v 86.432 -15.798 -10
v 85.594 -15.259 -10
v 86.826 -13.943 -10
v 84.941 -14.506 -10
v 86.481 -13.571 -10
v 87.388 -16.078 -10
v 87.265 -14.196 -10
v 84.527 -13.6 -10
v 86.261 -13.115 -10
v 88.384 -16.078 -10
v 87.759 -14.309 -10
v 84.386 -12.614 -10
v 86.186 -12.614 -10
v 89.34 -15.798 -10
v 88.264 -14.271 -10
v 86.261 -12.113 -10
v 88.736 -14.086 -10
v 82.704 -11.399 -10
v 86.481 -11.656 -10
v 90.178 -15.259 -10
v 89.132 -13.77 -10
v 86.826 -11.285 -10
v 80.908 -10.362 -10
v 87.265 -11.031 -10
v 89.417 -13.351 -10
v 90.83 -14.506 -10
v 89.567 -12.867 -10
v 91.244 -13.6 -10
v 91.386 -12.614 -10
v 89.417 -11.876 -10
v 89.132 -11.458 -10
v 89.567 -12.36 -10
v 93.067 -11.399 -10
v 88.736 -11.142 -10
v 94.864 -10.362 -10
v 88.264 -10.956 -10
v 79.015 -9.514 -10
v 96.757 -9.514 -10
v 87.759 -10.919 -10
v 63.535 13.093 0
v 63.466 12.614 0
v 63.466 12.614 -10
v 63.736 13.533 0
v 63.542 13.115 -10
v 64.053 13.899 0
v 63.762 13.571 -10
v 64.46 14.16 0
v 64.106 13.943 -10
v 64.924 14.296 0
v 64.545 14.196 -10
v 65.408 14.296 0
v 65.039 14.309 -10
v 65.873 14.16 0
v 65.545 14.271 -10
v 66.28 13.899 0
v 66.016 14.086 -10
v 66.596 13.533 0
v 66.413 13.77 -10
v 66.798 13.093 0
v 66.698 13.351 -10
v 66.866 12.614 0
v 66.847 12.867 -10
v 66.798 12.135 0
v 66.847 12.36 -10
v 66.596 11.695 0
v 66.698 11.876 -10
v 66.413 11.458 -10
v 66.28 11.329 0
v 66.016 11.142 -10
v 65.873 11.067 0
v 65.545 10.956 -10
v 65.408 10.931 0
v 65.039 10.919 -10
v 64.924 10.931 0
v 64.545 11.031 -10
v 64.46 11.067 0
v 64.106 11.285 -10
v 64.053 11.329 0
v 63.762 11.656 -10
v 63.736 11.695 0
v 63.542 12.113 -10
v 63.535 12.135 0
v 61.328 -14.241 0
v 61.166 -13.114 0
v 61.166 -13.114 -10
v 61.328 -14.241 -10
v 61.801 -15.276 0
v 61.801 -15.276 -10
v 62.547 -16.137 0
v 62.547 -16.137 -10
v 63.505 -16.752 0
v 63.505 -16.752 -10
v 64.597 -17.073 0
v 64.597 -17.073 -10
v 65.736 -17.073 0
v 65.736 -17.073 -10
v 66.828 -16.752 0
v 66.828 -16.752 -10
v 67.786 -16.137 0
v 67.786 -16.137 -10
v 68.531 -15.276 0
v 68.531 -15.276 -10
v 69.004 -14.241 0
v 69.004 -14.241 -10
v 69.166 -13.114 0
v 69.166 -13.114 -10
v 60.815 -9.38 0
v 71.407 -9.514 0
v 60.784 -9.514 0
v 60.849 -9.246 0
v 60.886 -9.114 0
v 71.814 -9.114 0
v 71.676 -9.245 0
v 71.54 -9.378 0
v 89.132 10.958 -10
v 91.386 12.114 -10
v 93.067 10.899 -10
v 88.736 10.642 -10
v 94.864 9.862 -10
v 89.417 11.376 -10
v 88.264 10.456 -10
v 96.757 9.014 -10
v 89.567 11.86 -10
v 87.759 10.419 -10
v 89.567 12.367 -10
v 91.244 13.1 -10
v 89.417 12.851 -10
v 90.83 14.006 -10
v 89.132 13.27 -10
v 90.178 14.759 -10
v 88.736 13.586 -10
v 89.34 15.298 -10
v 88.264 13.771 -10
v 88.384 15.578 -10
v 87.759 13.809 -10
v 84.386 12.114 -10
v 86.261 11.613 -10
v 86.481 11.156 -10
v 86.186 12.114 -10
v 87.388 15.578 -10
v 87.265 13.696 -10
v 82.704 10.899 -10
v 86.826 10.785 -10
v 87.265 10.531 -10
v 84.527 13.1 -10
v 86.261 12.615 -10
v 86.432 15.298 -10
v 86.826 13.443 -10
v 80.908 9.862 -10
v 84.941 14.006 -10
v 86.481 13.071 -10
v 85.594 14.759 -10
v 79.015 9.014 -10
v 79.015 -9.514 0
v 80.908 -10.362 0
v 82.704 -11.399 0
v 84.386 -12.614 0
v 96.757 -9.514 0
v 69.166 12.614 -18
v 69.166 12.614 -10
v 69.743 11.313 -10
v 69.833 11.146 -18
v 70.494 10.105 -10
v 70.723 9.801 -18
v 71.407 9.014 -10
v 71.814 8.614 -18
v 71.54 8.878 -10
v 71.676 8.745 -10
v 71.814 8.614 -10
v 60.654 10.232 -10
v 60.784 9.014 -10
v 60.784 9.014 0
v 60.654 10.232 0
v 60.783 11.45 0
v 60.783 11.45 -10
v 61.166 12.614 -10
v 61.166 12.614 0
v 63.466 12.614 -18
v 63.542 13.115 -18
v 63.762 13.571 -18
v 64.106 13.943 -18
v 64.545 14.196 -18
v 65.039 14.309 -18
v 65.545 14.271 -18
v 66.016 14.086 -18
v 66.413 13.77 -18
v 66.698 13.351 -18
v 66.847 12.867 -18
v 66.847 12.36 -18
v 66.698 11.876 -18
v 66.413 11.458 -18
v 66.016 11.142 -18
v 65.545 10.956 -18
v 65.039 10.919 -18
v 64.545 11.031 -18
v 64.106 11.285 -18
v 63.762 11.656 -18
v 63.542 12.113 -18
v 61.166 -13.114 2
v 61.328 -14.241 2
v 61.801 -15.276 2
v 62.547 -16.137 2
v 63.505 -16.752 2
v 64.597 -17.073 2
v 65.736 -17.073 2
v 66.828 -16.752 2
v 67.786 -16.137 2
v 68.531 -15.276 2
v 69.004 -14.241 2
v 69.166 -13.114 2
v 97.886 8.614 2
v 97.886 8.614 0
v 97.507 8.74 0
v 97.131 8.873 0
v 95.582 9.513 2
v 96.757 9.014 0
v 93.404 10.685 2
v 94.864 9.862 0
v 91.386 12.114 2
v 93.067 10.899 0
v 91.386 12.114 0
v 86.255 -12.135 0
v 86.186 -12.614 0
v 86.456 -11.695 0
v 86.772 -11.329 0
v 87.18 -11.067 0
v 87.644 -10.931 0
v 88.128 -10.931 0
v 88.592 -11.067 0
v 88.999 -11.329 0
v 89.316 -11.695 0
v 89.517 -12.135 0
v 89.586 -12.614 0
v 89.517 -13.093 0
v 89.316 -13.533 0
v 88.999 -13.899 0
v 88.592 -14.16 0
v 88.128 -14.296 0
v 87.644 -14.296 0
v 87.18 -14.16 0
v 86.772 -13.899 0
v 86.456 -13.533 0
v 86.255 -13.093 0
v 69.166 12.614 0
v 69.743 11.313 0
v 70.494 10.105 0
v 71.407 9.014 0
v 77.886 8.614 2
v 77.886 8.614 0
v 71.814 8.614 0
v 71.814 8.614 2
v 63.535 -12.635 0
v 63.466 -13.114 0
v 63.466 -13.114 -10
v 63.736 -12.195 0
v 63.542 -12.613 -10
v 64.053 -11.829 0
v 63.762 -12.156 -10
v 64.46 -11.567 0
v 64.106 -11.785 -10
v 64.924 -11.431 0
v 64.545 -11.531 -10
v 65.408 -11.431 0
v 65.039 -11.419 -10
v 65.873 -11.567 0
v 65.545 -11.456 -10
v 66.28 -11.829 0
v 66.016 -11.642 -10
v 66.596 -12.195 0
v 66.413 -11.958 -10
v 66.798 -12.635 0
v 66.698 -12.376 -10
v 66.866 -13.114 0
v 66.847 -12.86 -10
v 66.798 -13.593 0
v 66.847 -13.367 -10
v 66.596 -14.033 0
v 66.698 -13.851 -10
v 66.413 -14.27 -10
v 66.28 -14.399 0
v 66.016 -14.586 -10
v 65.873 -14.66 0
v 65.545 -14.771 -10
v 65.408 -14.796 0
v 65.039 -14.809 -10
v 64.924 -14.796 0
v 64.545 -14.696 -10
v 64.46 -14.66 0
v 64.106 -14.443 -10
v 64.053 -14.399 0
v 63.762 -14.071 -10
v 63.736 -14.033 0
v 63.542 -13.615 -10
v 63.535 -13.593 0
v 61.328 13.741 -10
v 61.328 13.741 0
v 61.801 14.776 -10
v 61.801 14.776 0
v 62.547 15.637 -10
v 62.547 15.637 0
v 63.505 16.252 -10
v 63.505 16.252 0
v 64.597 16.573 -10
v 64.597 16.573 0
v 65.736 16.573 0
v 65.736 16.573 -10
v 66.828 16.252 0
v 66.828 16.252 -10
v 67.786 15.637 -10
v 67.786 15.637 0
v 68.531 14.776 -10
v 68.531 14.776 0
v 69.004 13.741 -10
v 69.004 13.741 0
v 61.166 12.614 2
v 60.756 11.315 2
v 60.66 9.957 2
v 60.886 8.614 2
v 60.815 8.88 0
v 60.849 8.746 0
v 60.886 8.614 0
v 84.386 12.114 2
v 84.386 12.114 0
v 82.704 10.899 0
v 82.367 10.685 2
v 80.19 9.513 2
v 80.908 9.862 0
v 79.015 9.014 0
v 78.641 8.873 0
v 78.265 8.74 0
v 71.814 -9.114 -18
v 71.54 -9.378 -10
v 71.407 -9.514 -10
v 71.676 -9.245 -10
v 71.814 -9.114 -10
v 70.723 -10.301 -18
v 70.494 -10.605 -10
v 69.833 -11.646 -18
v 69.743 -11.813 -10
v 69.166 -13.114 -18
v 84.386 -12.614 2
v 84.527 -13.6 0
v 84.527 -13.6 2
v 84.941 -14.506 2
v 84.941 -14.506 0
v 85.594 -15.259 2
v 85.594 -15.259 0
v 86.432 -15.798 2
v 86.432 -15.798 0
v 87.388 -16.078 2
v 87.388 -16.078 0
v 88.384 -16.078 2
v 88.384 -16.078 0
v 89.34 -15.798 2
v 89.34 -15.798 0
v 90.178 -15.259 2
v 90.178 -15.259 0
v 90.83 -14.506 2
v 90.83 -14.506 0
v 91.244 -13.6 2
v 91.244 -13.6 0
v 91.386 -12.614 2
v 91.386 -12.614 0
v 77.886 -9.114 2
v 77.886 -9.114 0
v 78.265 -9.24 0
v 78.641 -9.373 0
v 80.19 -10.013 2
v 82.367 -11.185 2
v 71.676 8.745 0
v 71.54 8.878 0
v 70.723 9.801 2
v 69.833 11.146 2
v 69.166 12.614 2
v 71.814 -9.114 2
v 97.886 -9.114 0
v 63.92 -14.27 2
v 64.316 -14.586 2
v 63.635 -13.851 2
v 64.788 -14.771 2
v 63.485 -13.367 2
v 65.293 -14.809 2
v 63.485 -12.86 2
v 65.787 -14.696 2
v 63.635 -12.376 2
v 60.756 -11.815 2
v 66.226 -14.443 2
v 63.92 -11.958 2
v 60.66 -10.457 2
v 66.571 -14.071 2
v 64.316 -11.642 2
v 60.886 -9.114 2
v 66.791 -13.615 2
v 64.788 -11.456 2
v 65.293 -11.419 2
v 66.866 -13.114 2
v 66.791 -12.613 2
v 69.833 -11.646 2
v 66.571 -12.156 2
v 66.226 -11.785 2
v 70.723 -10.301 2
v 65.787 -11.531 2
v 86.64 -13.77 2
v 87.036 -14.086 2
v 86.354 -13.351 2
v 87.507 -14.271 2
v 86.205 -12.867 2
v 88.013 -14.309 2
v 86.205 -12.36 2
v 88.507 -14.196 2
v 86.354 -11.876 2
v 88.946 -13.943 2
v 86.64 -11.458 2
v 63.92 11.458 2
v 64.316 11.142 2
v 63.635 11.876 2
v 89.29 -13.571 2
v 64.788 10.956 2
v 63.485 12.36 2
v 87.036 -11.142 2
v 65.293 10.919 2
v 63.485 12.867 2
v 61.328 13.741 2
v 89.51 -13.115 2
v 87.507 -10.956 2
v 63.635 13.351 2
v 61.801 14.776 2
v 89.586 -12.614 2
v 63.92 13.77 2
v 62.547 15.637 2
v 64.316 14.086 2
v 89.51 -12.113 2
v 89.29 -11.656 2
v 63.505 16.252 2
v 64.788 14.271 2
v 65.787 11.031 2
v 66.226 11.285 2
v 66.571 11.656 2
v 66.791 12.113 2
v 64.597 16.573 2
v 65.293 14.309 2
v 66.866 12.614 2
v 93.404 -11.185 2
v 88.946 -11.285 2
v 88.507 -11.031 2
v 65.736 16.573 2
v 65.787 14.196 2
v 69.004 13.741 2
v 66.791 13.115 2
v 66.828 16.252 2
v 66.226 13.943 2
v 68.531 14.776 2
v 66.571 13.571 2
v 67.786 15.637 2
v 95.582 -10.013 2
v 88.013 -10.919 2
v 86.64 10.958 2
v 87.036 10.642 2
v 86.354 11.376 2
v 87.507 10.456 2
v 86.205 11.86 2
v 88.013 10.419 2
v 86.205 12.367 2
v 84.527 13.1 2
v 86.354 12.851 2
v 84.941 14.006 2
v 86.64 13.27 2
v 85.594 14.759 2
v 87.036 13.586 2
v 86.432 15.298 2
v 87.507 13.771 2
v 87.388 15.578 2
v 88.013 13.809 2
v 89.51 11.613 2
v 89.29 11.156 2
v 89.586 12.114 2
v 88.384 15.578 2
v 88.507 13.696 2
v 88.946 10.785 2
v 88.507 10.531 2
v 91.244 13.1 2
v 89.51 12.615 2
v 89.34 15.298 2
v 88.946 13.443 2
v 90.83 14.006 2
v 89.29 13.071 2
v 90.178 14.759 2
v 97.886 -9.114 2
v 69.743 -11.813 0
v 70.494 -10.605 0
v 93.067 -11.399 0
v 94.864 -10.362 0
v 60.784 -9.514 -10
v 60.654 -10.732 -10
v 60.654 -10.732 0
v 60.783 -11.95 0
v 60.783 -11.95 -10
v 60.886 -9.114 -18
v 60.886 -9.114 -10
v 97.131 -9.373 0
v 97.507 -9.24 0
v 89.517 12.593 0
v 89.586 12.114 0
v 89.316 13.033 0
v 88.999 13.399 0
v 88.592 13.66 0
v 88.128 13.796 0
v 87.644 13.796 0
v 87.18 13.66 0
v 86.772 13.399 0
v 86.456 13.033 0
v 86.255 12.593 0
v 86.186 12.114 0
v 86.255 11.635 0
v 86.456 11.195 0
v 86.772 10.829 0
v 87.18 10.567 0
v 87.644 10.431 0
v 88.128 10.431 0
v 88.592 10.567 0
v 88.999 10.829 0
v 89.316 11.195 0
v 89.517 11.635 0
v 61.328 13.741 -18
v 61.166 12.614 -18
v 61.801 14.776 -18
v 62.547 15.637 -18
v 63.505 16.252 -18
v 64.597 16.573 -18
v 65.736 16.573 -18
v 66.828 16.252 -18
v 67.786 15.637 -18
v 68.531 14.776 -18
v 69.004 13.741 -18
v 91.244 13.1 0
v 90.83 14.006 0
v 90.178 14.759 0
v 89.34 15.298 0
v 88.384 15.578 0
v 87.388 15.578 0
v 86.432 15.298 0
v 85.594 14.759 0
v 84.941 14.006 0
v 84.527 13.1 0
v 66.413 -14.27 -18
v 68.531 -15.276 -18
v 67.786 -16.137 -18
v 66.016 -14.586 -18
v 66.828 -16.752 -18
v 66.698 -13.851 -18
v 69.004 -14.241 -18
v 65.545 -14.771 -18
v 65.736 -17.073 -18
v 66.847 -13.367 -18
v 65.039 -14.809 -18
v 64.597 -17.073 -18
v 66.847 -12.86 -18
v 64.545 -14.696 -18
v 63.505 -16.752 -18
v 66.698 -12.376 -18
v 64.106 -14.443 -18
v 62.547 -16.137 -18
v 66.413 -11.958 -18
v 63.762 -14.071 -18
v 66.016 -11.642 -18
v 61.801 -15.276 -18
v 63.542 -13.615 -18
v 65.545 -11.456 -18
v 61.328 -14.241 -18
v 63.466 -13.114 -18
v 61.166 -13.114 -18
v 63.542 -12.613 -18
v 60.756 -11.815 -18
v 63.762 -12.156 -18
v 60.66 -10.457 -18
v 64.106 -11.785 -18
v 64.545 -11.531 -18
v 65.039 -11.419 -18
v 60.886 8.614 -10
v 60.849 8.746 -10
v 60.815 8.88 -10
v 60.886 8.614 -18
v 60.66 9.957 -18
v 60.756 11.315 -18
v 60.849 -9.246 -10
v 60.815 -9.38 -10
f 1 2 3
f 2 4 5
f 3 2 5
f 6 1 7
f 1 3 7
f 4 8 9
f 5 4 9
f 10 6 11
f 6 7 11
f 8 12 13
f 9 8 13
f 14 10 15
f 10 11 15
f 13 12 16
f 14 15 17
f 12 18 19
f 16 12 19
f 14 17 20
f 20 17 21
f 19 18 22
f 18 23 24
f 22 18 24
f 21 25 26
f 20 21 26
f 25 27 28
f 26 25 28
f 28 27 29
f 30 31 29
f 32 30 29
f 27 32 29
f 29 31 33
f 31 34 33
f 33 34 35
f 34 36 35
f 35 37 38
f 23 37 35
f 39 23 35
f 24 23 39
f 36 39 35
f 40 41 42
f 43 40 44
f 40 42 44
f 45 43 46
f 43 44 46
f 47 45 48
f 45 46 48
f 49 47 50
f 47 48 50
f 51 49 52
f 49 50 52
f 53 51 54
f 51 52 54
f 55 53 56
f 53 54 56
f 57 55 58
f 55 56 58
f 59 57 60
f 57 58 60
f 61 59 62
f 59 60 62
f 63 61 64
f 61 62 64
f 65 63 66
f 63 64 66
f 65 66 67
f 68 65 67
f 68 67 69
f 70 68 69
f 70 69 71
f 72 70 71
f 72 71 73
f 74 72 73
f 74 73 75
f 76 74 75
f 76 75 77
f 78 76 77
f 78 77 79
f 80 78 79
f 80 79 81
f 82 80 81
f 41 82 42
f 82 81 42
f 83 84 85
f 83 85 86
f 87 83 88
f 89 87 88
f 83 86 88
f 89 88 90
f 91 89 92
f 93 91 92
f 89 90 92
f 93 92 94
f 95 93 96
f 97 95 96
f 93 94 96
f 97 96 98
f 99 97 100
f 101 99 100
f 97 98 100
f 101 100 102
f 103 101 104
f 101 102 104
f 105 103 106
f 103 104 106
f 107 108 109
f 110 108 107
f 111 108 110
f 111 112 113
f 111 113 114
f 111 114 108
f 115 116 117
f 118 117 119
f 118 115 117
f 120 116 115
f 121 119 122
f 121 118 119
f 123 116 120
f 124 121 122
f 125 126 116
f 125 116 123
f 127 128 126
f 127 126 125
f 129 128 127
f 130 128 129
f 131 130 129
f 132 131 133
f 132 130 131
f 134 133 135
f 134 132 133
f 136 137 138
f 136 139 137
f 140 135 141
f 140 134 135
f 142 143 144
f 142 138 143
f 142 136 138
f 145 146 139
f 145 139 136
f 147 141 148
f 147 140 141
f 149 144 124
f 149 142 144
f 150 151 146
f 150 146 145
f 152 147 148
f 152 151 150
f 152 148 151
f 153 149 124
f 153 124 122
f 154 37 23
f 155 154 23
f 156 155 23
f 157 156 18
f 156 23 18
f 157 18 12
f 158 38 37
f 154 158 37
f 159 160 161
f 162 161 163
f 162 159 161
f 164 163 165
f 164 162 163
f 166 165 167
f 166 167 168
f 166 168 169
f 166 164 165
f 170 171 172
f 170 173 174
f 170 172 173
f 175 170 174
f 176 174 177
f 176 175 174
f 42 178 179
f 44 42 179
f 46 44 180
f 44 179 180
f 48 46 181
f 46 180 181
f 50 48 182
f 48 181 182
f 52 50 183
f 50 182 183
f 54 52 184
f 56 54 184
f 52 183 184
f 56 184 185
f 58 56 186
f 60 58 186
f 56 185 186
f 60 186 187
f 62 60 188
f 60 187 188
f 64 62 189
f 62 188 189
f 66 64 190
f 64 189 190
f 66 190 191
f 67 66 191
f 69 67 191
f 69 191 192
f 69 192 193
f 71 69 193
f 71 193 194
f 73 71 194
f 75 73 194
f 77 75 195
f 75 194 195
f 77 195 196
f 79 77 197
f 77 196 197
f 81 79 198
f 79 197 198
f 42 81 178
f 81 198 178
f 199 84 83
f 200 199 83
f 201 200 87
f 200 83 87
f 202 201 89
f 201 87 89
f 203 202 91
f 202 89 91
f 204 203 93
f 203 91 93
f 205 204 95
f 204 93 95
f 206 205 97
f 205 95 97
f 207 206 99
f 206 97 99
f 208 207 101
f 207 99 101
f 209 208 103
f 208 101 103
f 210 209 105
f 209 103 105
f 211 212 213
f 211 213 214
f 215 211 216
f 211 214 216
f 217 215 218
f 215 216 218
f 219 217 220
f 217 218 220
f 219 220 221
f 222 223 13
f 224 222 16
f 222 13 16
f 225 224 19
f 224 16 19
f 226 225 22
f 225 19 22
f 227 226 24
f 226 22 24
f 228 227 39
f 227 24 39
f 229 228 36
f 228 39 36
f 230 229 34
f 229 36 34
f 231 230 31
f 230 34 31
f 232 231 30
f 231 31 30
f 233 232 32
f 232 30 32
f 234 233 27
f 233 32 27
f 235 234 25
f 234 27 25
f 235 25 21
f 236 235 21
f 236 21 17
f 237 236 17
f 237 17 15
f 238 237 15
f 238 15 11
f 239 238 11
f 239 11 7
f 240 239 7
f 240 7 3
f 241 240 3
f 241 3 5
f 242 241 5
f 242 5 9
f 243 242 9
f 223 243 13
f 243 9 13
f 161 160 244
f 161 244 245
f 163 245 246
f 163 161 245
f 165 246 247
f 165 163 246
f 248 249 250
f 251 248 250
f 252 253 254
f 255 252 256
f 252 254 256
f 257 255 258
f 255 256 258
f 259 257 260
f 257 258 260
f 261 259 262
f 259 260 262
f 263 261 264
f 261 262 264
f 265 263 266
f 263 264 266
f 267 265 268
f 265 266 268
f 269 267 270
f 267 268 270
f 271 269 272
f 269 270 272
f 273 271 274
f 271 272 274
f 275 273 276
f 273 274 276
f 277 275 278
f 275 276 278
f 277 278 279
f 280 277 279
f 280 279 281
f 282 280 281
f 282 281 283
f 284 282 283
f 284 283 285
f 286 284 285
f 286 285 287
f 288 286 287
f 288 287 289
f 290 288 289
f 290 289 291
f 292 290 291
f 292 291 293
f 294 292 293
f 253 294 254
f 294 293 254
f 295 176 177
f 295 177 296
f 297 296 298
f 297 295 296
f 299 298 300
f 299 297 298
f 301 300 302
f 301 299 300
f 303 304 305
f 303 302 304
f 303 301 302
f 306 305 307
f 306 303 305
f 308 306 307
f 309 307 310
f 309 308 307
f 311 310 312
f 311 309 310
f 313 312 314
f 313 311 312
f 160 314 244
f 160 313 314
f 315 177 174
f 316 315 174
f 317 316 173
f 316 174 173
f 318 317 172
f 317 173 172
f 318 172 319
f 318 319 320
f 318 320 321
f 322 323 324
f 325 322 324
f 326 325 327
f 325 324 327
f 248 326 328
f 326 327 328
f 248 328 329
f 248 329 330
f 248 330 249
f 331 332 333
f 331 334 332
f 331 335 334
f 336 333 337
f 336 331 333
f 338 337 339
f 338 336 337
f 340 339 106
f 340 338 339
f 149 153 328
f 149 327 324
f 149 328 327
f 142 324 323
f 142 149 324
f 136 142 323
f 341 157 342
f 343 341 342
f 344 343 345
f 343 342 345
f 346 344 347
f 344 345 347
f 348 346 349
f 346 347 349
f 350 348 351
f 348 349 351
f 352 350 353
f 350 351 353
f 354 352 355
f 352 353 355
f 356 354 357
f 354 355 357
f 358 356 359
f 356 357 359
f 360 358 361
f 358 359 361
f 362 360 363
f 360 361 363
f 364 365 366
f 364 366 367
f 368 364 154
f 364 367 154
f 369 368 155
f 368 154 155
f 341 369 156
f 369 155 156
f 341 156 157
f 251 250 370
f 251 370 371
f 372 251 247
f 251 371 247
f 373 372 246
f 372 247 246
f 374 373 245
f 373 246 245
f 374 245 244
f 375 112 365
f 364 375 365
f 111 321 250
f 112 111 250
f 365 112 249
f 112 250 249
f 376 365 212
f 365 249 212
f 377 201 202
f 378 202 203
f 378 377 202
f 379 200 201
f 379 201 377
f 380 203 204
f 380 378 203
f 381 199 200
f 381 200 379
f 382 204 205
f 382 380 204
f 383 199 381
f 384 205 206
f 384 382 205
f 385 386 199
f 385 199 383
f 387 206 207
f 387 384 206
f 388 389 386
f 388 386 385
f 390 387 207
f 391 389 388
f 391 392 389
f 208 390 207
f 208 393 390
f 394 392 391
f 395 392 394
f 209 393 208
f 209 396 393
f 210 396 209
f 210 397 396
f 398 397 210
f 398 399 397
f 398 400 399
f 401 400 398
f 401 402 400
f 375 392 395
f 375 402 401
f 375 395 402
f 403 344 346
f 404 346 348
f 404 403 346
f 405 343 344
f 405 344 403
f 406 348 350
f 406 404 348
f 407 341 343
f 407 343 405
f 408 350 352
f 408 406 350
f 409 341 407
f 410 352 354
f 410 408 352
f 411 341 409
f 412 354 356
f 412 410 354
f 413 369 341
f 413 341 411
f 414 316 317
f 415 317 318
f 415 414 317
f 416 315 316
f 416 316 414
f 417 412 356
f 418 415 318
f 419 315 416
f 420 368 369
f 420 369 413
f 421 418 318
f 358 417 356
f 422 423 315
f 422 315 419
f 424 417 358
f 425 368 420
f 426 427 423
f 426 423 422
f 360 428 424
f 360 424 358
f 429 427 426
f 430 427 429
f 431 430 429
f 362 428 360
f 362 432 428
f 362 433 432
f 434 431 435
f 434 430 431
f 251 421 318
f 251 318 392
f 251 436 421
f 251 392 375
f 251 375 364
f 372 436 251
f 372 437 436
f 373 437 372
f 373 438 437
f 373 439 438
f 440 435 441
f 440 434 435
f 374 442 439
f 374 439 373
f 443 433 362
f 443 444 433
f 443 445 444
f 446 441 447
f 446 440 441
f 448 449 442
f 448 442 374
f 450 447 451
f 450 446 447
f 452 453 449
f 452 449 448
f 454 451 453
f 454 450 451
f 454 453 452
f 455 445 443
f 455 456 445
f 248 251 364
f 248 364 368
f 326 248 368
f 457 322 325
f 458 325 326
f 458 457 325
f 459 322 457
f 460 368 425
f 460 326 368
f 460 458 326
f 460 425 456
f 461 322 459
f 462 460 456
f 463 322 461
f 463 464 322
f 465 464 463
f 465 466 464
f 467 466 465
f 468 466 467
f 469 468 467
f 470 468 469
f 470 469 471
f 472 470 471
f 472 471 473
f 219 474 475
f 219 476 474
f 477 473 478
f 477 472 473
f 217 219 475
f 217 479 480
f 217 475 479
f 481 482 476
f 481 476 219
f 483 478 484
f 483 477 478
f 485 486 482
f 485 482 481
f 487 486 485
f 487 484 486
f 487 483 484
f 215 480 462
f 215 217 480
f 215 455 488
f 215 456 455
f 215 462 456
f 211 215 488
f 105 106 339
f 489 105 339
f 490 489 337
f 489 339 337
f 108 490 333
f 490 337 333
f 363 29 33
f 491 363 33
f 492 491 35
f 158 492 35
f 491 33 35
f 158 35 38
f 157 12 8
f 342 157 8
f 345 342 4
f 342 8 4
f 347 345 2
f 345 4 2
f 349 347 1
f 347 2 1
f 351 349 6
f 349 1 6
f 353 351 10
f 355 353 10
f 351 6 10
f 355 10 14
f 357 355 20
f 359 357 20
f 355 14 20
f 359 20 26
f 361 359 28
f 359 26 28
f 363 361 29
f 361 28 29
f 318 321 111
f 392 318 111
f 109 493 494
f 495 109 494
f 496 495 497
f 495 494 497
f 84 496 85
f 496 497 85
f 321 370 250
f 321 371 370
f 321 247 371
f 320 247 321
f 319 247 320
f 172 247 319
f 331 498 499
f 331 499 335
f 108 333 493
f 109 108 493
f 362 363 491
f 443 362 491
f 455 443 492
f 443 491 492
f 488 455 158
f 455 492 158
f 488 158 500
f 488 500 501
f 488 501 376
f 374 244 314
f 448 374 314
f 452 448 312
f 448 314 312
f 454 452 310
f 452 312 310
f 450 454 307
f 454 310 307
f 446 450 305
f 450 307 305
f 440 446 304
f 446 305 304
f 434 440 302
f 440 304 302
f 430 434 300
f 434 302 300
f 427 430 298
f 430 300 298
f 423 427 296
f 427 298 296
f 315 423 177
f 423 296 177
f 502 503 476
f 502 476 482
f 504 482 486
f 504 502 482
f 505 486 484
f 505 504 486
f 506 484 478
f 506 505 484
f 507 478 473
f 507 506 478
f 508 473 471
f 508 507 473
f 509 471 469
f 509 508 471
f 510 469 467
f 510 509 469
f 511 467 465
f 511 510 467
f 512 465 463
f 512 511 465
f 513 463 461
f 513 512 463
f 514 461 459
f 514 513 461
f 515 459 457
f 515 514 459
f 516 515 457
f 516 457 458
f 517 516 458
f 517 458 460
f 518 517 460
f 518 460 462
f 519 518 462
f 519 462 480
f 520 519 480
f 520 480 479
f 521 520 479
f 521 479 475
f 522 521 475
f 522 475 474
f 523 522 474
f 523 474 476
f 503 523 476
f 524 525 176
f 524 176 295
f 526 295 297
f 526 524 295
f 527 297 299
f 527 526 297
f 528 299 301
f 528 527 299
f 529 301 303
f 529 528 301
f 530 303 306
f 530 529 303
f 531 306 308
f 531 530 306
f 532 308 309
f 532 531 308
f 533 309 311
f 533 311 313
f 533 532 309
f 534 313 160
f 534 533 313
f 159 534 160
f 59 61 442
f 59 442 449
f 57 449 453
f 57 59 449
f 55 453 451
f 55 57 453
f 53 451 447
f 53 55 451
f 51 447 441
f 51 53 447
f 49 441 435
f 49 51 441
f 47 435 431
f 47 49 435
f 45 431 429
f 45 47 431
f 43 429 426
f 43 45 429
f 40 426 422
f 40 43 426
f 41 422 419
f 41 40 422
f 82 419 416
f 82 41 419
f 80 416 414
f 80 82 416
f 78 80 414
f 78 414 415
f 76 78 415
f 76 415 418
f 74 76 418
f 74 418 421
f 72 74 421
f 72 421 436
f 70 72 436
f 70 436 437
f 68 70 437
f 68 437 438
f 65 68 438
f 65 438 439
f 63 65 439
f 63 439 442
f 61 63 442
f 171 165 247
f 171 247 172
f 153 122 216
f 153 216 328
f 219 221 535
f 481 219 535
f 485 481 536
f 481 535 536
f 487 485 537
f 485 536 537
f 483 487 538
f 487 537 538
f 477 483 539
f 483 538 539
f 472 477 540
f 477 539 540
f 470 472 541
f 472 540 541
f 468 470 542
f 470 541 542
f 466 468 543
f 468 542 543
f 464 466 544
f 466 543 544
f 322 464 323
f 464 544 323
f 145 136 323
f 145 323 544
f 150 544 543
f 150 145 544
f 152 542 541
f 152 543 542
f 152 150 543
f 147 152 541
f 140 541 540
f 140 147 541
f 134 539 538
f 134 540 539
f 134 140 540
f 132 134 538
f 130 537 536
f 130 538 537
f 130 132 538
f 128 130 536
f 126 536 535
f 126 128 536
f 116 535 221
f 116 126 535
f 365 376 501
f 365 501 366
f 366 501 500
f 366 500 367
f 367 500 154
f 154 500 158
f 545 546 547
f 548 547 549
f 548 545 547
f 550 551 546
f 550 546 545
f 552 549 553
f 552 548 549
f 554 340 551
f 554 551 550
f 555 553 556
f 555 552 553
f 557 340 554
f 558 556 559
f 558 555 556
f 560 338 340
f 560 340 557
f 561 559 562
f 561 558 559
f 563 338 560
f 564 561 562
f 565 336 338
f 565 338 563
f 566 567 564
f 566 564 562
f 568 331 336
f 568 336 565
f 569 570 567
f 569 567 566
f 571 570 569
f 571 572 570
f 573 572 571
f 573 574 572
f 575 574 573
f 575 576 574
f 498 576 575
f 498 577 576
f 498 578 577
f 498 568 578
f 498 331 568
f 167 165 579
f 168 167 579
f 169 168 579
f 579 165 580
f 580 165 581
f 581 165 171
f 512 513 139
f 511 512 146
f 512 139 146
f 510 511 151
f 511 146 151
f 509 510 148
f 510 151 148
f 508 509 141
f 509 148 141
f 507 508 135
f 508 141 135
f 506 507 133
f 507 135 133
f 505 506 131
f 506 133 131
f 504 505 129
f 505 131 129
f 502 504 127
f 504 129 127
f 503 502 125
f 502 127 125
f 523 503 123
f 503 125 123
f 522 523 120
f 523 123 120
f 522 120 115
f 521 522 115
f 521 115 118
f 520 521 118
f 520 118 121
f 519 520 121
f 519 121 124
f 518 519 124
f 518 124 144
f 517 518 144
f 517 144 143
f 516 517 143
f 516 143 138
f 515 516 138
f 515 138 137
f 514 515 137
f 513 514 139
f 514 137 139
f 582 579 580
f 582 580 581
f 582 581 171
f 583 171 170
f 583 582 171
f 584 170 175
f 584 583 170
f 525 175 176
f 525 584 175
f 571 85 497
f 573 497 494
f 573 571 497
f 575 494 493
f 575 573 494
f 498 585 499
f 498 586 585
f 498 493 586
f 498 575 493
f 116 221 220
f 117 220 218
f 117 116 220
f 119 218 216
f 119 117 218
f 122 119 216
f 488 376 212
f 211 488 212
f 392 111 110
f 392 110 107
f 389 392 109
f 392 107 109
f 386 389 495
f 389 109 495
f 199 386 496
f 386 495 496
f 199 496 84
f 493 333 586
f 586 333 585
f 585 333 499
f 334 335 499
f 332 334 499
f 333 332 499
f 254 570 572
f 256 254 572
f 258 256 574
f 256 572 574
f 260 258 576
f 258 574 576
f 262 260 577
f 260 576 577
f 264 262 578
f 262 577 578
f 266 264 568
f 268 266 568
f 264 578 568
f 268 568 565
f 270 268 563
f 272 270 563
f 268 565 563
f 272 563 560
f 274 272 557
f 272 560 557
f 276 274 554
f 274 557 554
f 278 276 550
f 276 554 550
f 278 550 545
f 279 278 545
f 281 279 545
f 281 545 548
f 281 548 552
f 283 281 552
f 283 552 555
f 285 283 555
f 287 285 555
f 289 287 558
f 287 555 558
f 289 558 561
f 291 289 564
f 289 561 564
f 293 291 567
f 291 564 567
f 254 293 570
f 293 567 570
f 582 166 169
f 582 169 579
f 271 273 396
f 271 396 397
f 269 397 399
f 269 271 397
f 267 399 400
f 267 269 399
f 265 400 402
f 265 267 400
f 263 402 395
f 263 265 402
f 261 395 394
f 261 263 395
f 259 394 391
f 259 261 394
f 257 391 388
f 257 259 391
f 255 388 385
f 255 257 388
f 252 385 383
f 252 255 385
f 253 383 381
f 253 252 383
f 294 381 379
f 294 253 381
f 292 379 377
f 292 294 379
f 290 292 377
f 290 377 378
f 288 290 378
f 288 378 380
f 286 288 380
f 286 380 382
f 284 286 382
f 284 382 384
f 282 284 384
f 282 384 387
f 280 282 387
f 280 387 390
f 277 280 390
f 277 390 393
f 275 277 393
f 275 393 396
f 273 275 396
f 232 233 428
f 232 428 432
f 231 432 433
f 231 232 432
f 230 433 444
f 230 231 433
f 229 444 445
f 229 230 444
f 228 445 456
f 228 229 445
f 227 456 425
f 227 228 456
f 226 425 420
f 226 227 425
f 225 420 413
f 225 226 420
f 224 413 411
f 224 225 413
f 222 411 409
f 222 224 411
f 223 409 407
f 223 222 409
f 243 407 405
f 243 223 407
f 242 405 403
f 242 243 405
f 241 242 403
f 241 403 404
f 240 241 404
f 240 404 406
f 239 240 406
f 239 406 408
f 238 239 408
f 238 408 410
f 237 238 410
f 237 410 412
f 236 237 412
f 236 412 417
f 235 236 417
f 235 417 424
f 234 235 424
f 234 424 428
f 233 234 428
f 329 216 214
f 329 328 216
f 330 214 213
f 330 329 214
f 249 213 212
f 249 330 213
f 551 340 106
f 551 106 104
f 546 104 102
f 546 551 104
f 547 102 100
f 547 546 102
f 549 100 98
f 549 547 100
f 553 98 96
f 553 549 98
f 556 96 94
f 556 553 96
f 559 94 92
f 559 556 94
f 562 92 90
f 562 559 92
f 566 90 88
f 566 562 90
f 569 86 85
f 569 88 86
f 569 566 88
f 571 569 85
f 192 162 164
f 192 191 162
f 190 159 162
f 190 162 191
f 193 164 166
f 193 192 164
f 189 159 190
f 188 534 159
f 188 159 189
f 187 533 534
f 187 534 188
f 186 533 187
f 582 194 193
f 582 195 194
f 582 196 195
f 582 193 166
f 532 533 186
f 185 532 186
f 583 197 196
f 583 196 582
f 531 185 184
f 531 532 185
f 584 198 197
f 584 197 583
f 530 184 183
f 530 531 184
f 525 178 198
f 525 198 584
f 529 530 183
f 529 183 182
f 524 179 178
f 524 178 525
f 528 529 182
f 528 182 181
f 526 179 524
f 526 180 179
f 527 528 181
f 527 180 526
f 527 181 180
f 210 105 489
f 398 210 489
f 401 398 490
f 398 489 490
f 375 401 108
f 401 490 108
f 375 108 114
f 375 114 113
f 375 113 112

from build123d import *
from build123d.topology import SkipClean

# Parameters (mm, degrees)
CROQUIS1_R              = 1.7
SALIENTE_EXTRUIR1_DEPTH = 2
SALIENTE_EXTRUIR2_START = 10
CROQUIS2_R              = 1.7
SALIENTE_EXTRUIR2_DEPTH = 10
SALIENTE_EXTRUIR3_START = 8
CROQUIS3_R              = 1.7
SALIENTE_EXTRUIR3_DEPTH = 8
CROQUIS4_W              = 37.50862419
CROQUIS4_H              = 18.52759439
CORTAR_EXTRUIR1_DEPTH   = 10


with BuildPart() as part:
    # Croquis1 → Saliente-Extruir1 (new body)
    with BuildSketch(Plane.XY):
        with BuildLine():
            Line((77.885724234, 8.613797195), (71.814275766, 8.613797195))
            ThreePointArc((71.814275766, 8.613797195), (70.251539785, 10.455729214), (69.166367035, 12.613797195))
            ThreePointArc((69.166367035, 12.613797195), (65.166367035, 16.613797195), (61.166367035, 12.613797195))
            ThreePointArc((61.166367035, 12.613797195), (60.667946699, 10.638921667), (60.885724234, 8.613797195))
            Line((60.885724234, 8.613797195), (60.885724234, -9.113797195))
            ThreePointArc((60.885724234, -9.113797195), (60.667946699, -11.138921667), (61.166367035, -13.113797195))
            ThreePointArc((61.166367035, -13.113797195), (65.166367035, -17.113797195), (69.166367035, -13.113797195))
            ThreePointArc((69.166367035, -13.113797195), (70.251539785, -10.955729214), (71.814275766, -9.113797195))
            Line((71.814275766, -9.113797195), (77.885724234, -9.113797195))
            ThreePointArc((77.885724234, -9.113797195), (81.296227313, -10.565720048), (84.385724234, -12.613797195))
            ThreePointArc((84.385724234, -12.613797195), (87.885724234, -16.113797195), (91.385724234, -12.613797195))
            ThreePointArc((91.385724234, -12.613797195), (94.475221154, -10.565720048), (97.885724234, -9.113797195))
            Line((97.885724234, -9.113797195), (97.885724234, 8.613797195))
            ThreePointArc((97.885724234, 8.613797195), (94.475221154, 10.065720048), (91.385724234, 12.113797195))
            ThreePointArc((91.385724234, 12.113797195), (87.885724234, 15.613797195), (84.385724234, 12.113797195))
            ThreePointArc((84.385724234, 12.113797195), (81.296227313, 10.065720048), (77.885724234, 8.613797195))
        make_face()
        with Locations((65.166367035, -13.113797195)):
            Circle(CROQUIS1_R, mode=Mode.SUBTRACT)
        with Locations((65.166367035, 12.613797195)):
            Circle(CROQUIS1_R, mode=Mode.SUBTRACT)
        with Locations((87.885724234, 12.113797195)):
            Circle(CROQUIS1_R, mode=Mode.SUBTRACT)
        with Locations((87.885724234, -12.613797195)):
            Circle(CROQUIS1_R, mode=Mode.SUBTRACT)
    extrude(amount=SALIENTE_EXTRUIR1_DEPTH)

    # Croquis2 → Saliente-Extruir2 (add)
    # profile 1 of 4: a face of its own
    with SkipClean():  # the faces are left unmerged after this step: merging them gives an invalid solid
        with BuildSketch(Plane(origin=(0, 0, 0), x_dir=(-1, 0, 0), z_dir=(0, 0, -1)).offset(SALIENTE_EXTRUIR2_START)):
            with BuildLine():
                Line((-97.885724234, -9.113797195), (-77.885724234, -9.113797195))
                ThreePointArc((-77.885724234, -9.113797195), (-81.296227313, -10.565720048), (-84.385724234, -12.613797195))
                ThreePointArc((-84.385724234, -12.613797195), (-87.885724234, -16.113797195), (-91.385724234, -12.613797195))
                ThreePointArc((-91.385724234, -12.613797195), (-94.475221154, -10.565720048), (-97.885724234, -9.113797195))
            make_face()
            with Locations((-87.885724234, -12.613797195)):
                Circle(CROQUIS2_R, mode=Mode.SUBTRACT)
        # profile 2 of 4: a face of its own
        with BuildSketch(Plane(origin=(0, 0, 0), x_dir=(-1, 0, 0), z_dir=(0, 0, -1)).offset(SALIENTE_EXTRUIR2_START)):
            with BuildLine():
                Line((-97.885724234, 8.613797195), (-77.885724234, 8.613797195))
                ThreePointArc((-77.885724234, 8.613797195), (-81.296227313, 10.065720048), (-84.385724234, 12.113797195))
                ThreePointArc((-84.385724234, 12.113797195), (-87.885724234, 15.613797195), (-91.385724234, 12.113797195))
                ThreePointArc((-91.385724234, 12.113797195), (-94.475221154, 10.065720048), (-97.885724234, 8.613797195))
            make_face()
            with Locations((-87.885724234, 12.113797195)):
                Circle(CROQUIS2_R, mode=Mode.SUBTRACT)
        # profile 3 of 4: a face of its own
        with BuildSketch(Plane(origin=(0, 0, 0), x_dir=(-1, 0, 0), z_dir=(0, 0, -1)).offset(SALIENTE_EXTRUIR2_START)):
            with BuildLine():
                Line((-71.814275766, 8.613797195), (-60.885724234, 8.613797195))
                ThreePointArc((-60.885724234, 8.613797195), (-60.667946699, 10.638921667), (-61.166367035, 12.613797195))
                ThreePointArc((-61.166367035, 12.613797195), (-65.166367035, 16.613797195), (-69.166367035, 12.613797195))
                ThreePointArc((-69.166367035, 12.613797195), (-70.251539785, 10.455729214), (-71.814275766, 8.613797195))
            make_face()
            with Locations((-65.166367035, 12.613797195)):
                Circle(CROQUIS2_R, mode=Mode.SUBTRACT)
        # profile 4 of 4: a face of its own
        with BuildSketch(Plane(origin=(0, 0, 0), x_dir=(-1, 0, 0), z_dir=(0, 0, -1)).offset(SALIENTE_EXTRUIR2_START)):
            with BuildLine():
                Line((-71.814275766, -9.113797195), (-60.885724234, -9.113797195))
                ThreePointArc((-60.885724234, -9.113797195), (-60.667946699, -11.138921667), (-61.166367035, -13.113797195))
                ThreePointArc((-61.166367035, -13.113797195), (-65.166367035, -17.113797195), (-69.166367035, -13.113797195))
                ThreePointArc((-69.166367035, -13.113797195), (-70.251539785, -10.955729214), (-71.814275766, -9.113797195))
            make_face()
            with Locations((-65.166367035, -13.113797195)):
                Circle(CROQUIS2_R, mode=Mode.SUBTRACT)
        extrude(amount=-SALIENTE_EXTRUIR2_DEPTH)

    # Croquis3 → Saliente-Extruir3 (add)
    # profile 1 of 2: a face of its own
    with SkipClean():  # the faces are left unmerged after this step: merging them gives an invalid solid
        with BuildSketch(Plane(origin=(0, 0, -10), x_dir=(-1, 0, 0), z_dir=(0, 0, -1)).offset(SALIENTE_EXTRUIR3_START)):
            with BuildLine():
                Line((-71.814275766, 8.613797195), (-60.885724234, 8.613797195))
                ThreePointArc((-60.885724234, 8.613797195), (-60.667946699, 10.638921667), (-61.166367035, 12.613797195))
                ThreePointArc((-61.166367035, 12.613797195), (-65.166367035, 16.613797195), (-69.166367035, 12.613797195))
                ThreePointArc((-69.166367035, 12.613797195), (-70.251539785, 10.455729214), (-71.814275766, 8.613797195))
            make_face()
            with Locations((-65.166367035, 12.613797195)):
                Circle(CROQUIS3_R, mode=Mode.SUBTRACT)
        # profile 2 of 2: a face of its own
        with BuildSketch(Plane(origin=(0, 0, -10), x_dir=(-1, 0, 0), z_dir=(0, 0, -1)).offset(SALIENTE_EXTRUIR3_START)):
            with BuildLine():
                Line((-60.885724234, -9.113797195), (-71.814275766, -9.113797195))
                ThreePointArc((-71.814275766, -9.113797195), (-70.251539785, -10.955729214), (-69.166367035, -13.113797195))
                ThreePointArc((-69.166367035, -13.113797195), (-65.166367035, -17.113797195), (-61.166367035, -13.113797195))
                ThreePointArc((-61.166367035, -13.113797195), (-60.667946699, -11.138921667), (-60.885724234, -9.113797195))
            make_face()
            with Locations((-65.166367035, -13.113797195)):
                Circle(CROQUIS3_R, mode=Mode.SUBTRACT)
        extrude(amount=-SALIENTE_EXTRUIR3_DEPTH)

    # Croquis4 → Cortar-Extruir1 (cut)
    with SkipClean():  # the faces are left unmerged after this step: merging them gives an invalid solid
        with BuildSketch(Plane(origin=(0, 0, -10), x_dir=(-1, 0, 0), z_dir=(0, 0, -1))):
            with Locations((-79.131412139, -0.25)):
                Rectangle(CROQUIS4_W, CROQUIS4_H)
        extrude(amount=-CORTAR_EXTRUIR1_DEPTH, mode=Mode.SUBTRACT)


solid = part.part
